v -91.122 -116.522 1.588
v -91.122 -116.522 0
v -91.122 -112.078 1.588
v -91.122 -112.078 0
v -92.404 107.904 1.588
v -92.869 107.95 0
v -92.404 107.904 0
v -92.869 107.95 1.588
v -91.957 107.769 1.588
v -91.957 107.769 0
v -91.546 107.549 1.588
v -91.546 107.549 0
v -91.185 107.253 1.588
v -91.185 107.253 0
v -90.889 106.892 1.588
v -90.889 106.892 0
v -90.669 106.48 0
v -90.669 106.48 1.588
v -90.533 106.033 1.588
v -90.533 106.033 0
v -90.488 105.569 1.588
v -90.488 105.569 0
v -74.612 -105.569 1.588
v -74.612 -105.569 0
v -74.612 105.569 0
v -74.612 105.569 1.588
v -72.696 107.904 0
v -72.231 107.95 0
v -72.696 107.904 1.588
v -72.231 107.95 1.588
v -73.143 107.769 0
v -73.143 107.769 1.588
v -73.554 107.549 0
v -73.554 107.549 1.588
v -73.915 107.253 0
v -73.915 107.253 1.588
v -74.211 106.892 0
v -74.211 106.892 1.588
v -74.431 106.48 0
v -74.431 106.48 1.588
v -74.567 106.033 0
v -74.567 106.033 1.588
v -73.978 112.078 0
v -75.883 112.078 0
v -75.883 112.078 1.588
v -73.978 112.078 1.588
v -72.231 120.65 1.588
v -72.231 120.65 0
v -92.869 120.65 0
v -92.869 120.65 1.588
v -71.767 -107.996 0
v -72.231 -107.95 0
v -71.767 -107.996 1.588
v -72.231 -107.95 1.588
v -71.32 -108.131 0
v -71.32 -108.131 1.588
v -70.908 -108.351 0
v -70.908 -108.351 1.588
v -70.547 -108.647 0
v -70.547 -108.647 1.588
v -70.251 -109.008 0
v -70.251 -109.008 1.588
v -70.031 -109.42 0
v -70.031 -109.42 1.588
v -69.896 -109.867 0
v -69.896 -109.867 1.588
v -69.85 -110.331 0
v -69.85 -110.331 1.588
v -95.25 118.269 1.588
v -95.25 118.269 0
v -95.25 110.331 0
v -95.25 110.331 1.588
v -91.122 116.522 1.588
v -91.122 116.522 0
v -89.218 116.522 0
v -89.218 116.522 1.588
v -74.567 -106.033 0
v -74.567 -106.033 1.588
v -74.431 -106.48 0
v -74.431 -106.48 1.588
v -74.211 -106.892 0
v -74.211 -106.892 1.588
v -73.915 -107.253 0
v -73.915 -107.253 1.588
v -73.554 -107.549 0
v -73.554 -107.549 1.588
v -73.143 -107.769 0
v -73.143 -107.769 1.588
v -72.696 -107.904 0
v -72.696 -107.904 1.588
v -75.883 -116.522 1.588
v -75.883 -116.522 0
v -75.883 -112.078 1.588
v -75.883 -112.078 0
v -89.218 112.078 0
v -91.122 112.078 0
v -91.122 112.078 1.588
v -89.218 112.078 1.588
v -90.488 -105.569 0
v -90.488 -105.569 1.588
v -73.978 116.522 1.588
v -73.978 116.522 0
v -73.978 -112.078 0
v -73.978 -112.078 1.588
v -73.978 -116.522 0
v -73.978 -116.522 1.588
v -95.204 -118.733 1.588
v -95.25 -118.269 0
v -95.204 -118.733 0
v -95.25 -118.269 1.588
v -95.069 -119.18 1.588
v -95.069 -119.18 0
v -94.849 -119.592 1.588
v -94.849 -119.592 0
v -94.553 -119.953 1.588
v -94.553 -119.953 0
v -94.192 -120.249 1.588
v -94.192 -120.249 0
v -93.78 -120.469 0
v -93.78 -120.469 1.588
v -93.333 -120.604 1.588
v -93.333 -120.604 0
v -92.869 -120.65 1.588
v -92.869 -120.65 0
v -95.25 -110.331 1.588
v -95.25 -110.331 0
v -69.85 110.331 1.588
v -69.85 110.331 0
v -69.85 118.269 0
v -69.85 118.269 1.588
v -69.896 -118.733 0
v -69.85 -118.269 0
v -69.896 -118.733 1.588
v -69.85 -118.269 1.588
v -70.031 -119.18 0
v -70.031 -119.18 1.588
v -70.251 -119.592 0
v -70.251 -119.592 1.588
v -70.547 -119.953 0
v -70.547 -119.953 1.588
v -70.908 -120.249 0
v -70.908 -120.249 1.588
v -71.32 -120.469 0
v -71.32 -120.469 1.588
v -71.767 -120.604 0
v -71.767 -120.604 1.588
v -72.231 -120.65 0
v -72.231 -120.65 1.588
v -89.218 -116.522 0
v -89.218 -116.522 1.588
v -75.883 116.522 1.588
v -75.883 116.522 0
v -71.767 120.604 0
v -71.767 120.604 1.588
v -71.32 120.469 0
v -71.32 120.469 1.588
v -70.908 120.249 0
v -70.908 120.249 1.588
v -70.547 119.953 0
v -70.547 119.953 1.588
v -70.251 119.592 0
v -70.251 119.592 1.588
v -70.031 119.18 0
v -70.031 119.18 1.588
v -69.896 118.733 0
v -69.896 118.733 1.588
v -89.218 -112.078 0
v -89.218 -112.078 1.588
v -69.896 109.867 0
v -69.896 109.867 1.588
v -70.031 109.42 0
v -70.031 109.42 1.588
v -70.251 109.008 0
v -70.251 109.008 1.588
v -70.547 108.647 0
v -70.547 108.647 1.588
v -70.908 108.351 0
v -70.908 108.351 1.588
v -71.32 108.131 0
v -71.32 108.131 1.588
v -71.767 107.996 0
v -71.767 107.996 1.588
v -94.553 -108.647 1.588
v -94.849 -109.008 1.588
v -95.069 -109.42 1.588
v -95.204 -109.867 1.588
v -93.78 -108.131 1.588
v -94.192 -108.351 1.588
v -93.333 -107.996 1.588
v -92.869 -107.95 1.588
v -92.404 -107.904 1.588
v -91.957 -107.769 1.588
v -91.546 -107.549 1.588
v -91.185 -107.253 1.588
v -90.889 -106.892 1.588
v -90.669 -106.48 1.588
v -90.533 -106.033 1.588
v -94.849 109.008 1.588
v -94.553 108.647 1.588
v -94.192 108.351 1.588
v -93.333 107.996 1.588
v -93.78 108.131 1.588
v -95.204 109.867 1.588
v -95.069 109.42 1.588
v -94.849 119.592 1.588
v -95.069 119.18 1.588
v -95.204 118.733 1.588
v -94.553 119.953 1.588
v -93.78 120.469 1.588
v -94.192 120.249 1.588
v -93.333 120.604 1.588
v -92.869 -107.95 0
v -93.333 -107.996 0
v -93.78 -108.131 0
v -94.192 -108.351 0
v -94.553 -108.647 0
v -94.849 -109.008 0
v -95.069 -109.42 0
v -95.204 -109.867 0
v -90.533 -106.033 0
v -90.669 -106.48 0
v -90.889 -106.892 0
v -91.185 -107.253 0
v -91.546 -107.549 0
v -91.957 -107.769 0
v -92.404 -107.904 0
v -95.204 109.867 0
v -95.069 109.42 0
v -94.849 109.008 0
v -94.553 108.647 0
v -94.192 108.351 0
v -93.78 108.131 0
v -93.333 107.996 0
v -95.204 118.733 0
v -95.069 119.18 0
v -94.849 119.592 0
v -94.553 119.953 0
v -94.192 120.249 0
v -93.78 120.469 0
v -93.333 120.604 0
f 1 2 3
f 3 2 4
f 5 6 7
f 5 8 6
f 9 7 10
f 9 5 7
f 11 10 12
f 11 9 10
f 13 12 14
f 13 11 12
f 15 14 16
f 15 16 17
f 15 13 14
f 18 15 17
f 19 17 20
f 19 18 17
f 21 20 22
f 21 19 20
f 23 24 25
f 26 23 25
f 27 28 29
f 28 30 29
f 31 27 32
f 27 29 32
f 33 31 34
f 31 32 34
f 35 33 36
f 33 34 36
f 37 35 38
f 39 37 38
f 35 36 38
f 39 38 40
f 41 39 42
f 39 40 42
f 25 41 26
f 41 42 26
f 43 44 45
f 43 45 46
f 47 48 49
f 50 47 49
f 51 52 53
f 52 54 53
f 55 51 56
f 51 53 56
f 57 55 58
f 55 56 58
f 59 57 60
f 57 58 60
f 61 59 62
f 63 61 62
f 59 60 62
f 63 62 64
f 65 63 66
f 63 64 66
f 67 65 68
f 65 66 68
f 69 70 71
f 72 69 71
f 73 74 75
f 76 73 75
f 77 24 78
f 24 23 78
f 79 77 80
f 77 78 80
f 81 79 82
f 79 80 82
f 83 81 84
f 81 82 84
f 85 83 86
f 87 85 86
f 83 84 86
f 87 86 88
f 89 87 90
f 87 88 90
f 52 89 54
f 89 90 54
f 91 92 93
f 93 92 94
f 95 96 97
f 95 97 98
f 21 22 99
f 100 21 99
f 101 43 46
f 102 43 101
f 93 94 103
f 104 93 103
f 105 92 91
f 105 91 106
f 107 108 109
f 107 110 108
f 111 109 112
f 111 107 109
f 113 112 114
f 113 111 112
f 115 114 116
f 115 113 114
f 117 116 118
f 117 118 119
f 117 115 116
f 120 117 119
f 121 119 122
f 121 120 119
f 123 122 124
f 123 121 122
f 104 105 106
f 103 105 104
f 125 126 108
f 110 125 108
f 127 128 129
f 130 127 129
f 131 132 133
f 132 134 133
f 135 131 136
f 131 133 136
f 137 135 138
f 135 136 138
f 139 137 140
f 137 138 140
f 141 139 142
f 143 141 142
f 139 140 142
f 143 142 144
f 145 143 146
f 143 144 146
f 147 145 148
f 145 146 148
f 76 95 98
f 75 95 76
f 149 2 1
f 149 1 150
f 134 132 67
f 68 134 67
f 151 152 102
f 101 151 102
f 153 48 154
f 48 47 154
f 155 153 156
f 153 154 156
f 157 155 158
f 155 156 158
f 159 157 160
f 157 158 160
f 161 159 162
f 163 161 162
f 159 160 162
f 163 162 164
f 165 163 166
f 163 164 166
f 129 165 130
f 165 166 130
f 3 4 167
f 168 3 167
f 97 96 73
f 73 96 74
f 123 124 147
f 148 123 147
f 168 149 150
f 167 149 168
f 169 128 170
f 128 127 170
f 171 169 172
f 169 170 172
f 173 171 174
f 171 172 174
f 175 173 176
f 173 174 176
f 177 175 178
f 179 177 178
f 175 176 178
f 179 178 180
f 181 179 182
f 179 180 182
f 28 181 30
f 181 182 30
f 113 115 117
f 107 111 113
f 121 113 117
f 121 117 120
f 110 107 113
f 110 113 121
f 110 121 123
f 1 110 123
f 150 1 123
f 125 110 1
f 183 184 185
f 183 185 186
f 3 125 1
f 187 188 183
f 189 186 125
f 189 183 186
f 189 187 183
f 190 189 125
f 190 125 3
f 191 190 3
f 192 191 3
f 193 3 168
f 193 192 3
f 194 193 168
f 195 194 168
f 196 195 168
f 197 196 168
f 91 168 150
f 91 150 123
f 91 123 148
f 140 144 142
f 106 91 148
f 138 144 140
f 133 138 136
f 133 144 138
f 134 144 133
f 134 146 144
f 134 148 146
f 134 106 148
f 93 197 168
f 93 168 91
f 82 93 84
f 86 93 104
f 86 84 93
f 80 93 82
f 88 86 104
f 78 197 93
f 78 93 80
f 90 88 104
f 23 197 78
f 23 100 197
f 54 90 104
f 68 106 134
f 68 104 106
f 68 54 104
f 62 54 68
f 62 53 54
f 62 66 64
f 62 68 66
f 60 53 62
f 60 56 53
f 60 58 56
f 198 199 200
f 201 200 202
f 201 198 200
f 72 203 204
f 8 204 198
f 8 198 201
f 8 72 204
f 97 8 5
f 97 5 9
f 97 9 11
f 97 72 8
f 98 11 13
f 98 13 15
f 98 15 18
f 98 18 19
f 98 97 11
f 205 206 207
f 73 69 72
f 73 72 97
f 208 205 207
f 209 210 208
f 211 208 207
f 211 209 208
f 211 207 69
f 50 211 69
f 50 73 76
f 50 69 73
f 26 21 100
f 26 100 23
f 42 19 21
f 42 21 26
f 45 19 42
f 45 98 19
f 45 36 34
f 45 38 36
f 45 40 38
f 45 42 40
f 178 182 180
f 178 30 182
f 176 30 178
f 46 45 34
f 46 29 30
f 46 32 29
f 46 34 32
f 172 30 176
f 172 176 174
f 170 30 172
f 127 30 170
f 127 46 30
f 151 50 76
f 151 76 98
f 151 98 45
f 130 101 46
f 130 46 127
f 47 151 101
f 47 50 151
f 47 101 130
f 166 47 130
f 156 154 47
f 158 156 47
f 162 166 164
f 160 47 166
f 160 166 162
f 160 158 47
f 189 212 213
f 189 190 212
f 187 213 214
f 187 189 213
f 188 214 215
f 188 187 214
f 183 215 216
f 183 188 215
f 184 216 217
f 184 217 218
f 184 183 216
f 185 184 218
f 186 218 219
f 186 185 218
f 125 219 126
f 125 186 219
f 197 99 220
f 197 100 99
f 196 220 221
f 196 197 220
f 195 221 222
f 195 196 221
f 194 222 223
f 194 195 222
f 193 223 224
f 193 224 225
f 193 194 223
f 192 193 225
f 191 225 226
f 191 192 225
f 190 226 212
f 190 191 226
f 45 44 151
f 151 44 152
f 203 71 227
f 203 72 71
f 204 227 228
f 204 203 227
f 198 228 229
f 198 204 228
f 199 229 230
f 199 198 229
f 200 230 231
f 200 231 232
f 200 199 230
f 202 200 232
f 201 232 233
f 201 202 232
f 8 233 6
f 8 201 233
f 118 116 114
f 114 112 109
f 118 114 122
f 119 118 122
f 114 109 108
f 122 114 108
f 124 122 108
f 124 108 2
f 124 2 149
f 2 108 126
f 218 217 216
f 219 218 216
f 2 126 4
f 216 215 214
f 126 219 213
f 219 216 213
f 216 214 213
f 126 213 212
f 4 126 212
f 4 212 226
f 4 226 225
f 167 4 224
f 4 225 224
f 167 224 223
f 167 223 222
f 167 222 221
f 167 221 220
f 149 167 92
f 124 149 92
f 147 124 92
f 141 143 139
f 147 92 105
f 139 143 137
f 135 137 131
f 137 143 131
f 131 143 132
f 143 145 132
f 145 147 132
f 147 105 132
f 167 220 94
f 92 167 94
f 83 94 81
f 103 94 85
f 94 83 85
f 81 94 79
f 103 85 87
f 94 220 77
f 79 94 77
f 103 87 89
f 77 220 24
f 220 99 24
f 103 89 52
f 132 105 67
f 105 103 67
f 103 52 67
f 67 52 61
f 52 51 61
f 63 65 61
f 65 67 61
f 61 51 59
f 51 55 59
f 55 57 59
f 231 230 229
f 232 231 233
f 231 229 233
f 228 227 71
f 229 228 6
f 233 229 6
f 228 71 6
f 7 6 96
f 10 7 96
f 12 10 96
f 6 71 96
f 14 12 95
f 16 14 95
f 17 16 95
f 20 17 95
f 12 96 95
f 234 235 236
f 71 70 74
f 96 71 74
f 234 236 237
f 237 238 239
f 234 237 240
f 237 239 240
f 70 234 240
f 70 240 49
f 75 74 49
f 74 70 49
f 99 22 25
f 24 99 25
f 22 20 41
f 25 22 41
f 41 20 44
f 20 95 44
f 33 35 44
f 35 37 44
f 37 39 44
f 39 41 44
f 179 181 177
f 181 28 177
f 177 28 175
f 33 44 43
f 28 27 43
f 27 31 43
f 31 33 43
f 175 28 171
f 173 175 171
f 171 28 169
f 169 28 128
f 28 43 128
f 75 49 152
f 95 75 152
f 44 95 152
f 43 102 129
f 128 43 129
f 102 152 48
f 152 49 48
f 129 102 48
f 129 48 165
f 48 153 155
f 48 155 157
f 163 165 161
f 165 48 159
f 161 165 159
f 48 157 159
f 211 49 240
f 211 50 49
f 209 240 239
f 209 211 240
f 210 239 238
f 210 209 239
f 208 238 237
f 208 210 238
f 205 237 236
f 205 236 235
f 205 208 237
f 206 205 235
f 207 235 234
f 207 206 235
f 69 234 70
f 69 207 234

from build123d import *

# Parameters (mm, degrees)
F0_W     = 1.905
F0_H     = 4.445
F1_DEPTH = 1.5875
F2_R     = 2.38124


# Not quite as in the source:
# - a fillet or chamfer is up to 0.001 mm smaller than in the source, because OpenCascade refuses the exact size


with BuildPart() as f1:
    # F0 (on Top) → F1 (new body)
    with BuildSketch(Plane.XY):
        Polygon((-69.85, 120.65), (-95.25, 120.65), (-95.25, 107.95), (-90.4875, 107.95), (-90.4875, -107.95), (-95.25, -107.95), (-95.25, -120.65), (-69.85, -120.65), (-69.85, -107.95), (-74.6125, -107.95), (-74.6125, 107.95), (-69.85, 107.95), align=None)
        with Locations((-90.17, -114.3)):
            Rectangle(F0_W, F0_H, mode=Mode.SUBTRACT)
        with Locations((-74.93, -114.3)):
            Rectangle(F0_W, F0_H, mode=Mode.SUBTRACT)
        with Locations((-90.17, 114.3)):
            Rectangle(F0_W, F0_H, mode=Mode.SUBTRACT)
        with Locations((-74.93, 114.3)):
            Rectangle(F0_W, F0_H, mode=Mode.SUBTRACT)
    extrude(amount=F1_DEPTH)

    # F2 (radius 2.38125 in the source; OpenCascade refuses exactly that, so slightly less here)
    f2_edges = [f1.edges().sort_by_distance(p)[0] for p in [
        (-90.4875, -107.95, 0.79375),
        (-95.25, -107.95, 0.79375),
        (-95.25, -120.65, 0.79375),
        (-69.85, -120.65, 0.79375),
        (-69.85, -107.95, 0.79375),
        (-74.6125, -107.95, 0.79375),
        (-69.85, 120.65, 0.79375),
        (-69.85, 107.95, 0.79375),
        (-95.25, 120.65, 0.79375),
        (-95.25, 107.95, 0.79375),
        (-74.6125, 107.95, 0.79375),
        (-90.4875, 107.95, 0.79375),
    ]]
    fillet(f2_edges, radius=F2_R)


solid = f1.part
